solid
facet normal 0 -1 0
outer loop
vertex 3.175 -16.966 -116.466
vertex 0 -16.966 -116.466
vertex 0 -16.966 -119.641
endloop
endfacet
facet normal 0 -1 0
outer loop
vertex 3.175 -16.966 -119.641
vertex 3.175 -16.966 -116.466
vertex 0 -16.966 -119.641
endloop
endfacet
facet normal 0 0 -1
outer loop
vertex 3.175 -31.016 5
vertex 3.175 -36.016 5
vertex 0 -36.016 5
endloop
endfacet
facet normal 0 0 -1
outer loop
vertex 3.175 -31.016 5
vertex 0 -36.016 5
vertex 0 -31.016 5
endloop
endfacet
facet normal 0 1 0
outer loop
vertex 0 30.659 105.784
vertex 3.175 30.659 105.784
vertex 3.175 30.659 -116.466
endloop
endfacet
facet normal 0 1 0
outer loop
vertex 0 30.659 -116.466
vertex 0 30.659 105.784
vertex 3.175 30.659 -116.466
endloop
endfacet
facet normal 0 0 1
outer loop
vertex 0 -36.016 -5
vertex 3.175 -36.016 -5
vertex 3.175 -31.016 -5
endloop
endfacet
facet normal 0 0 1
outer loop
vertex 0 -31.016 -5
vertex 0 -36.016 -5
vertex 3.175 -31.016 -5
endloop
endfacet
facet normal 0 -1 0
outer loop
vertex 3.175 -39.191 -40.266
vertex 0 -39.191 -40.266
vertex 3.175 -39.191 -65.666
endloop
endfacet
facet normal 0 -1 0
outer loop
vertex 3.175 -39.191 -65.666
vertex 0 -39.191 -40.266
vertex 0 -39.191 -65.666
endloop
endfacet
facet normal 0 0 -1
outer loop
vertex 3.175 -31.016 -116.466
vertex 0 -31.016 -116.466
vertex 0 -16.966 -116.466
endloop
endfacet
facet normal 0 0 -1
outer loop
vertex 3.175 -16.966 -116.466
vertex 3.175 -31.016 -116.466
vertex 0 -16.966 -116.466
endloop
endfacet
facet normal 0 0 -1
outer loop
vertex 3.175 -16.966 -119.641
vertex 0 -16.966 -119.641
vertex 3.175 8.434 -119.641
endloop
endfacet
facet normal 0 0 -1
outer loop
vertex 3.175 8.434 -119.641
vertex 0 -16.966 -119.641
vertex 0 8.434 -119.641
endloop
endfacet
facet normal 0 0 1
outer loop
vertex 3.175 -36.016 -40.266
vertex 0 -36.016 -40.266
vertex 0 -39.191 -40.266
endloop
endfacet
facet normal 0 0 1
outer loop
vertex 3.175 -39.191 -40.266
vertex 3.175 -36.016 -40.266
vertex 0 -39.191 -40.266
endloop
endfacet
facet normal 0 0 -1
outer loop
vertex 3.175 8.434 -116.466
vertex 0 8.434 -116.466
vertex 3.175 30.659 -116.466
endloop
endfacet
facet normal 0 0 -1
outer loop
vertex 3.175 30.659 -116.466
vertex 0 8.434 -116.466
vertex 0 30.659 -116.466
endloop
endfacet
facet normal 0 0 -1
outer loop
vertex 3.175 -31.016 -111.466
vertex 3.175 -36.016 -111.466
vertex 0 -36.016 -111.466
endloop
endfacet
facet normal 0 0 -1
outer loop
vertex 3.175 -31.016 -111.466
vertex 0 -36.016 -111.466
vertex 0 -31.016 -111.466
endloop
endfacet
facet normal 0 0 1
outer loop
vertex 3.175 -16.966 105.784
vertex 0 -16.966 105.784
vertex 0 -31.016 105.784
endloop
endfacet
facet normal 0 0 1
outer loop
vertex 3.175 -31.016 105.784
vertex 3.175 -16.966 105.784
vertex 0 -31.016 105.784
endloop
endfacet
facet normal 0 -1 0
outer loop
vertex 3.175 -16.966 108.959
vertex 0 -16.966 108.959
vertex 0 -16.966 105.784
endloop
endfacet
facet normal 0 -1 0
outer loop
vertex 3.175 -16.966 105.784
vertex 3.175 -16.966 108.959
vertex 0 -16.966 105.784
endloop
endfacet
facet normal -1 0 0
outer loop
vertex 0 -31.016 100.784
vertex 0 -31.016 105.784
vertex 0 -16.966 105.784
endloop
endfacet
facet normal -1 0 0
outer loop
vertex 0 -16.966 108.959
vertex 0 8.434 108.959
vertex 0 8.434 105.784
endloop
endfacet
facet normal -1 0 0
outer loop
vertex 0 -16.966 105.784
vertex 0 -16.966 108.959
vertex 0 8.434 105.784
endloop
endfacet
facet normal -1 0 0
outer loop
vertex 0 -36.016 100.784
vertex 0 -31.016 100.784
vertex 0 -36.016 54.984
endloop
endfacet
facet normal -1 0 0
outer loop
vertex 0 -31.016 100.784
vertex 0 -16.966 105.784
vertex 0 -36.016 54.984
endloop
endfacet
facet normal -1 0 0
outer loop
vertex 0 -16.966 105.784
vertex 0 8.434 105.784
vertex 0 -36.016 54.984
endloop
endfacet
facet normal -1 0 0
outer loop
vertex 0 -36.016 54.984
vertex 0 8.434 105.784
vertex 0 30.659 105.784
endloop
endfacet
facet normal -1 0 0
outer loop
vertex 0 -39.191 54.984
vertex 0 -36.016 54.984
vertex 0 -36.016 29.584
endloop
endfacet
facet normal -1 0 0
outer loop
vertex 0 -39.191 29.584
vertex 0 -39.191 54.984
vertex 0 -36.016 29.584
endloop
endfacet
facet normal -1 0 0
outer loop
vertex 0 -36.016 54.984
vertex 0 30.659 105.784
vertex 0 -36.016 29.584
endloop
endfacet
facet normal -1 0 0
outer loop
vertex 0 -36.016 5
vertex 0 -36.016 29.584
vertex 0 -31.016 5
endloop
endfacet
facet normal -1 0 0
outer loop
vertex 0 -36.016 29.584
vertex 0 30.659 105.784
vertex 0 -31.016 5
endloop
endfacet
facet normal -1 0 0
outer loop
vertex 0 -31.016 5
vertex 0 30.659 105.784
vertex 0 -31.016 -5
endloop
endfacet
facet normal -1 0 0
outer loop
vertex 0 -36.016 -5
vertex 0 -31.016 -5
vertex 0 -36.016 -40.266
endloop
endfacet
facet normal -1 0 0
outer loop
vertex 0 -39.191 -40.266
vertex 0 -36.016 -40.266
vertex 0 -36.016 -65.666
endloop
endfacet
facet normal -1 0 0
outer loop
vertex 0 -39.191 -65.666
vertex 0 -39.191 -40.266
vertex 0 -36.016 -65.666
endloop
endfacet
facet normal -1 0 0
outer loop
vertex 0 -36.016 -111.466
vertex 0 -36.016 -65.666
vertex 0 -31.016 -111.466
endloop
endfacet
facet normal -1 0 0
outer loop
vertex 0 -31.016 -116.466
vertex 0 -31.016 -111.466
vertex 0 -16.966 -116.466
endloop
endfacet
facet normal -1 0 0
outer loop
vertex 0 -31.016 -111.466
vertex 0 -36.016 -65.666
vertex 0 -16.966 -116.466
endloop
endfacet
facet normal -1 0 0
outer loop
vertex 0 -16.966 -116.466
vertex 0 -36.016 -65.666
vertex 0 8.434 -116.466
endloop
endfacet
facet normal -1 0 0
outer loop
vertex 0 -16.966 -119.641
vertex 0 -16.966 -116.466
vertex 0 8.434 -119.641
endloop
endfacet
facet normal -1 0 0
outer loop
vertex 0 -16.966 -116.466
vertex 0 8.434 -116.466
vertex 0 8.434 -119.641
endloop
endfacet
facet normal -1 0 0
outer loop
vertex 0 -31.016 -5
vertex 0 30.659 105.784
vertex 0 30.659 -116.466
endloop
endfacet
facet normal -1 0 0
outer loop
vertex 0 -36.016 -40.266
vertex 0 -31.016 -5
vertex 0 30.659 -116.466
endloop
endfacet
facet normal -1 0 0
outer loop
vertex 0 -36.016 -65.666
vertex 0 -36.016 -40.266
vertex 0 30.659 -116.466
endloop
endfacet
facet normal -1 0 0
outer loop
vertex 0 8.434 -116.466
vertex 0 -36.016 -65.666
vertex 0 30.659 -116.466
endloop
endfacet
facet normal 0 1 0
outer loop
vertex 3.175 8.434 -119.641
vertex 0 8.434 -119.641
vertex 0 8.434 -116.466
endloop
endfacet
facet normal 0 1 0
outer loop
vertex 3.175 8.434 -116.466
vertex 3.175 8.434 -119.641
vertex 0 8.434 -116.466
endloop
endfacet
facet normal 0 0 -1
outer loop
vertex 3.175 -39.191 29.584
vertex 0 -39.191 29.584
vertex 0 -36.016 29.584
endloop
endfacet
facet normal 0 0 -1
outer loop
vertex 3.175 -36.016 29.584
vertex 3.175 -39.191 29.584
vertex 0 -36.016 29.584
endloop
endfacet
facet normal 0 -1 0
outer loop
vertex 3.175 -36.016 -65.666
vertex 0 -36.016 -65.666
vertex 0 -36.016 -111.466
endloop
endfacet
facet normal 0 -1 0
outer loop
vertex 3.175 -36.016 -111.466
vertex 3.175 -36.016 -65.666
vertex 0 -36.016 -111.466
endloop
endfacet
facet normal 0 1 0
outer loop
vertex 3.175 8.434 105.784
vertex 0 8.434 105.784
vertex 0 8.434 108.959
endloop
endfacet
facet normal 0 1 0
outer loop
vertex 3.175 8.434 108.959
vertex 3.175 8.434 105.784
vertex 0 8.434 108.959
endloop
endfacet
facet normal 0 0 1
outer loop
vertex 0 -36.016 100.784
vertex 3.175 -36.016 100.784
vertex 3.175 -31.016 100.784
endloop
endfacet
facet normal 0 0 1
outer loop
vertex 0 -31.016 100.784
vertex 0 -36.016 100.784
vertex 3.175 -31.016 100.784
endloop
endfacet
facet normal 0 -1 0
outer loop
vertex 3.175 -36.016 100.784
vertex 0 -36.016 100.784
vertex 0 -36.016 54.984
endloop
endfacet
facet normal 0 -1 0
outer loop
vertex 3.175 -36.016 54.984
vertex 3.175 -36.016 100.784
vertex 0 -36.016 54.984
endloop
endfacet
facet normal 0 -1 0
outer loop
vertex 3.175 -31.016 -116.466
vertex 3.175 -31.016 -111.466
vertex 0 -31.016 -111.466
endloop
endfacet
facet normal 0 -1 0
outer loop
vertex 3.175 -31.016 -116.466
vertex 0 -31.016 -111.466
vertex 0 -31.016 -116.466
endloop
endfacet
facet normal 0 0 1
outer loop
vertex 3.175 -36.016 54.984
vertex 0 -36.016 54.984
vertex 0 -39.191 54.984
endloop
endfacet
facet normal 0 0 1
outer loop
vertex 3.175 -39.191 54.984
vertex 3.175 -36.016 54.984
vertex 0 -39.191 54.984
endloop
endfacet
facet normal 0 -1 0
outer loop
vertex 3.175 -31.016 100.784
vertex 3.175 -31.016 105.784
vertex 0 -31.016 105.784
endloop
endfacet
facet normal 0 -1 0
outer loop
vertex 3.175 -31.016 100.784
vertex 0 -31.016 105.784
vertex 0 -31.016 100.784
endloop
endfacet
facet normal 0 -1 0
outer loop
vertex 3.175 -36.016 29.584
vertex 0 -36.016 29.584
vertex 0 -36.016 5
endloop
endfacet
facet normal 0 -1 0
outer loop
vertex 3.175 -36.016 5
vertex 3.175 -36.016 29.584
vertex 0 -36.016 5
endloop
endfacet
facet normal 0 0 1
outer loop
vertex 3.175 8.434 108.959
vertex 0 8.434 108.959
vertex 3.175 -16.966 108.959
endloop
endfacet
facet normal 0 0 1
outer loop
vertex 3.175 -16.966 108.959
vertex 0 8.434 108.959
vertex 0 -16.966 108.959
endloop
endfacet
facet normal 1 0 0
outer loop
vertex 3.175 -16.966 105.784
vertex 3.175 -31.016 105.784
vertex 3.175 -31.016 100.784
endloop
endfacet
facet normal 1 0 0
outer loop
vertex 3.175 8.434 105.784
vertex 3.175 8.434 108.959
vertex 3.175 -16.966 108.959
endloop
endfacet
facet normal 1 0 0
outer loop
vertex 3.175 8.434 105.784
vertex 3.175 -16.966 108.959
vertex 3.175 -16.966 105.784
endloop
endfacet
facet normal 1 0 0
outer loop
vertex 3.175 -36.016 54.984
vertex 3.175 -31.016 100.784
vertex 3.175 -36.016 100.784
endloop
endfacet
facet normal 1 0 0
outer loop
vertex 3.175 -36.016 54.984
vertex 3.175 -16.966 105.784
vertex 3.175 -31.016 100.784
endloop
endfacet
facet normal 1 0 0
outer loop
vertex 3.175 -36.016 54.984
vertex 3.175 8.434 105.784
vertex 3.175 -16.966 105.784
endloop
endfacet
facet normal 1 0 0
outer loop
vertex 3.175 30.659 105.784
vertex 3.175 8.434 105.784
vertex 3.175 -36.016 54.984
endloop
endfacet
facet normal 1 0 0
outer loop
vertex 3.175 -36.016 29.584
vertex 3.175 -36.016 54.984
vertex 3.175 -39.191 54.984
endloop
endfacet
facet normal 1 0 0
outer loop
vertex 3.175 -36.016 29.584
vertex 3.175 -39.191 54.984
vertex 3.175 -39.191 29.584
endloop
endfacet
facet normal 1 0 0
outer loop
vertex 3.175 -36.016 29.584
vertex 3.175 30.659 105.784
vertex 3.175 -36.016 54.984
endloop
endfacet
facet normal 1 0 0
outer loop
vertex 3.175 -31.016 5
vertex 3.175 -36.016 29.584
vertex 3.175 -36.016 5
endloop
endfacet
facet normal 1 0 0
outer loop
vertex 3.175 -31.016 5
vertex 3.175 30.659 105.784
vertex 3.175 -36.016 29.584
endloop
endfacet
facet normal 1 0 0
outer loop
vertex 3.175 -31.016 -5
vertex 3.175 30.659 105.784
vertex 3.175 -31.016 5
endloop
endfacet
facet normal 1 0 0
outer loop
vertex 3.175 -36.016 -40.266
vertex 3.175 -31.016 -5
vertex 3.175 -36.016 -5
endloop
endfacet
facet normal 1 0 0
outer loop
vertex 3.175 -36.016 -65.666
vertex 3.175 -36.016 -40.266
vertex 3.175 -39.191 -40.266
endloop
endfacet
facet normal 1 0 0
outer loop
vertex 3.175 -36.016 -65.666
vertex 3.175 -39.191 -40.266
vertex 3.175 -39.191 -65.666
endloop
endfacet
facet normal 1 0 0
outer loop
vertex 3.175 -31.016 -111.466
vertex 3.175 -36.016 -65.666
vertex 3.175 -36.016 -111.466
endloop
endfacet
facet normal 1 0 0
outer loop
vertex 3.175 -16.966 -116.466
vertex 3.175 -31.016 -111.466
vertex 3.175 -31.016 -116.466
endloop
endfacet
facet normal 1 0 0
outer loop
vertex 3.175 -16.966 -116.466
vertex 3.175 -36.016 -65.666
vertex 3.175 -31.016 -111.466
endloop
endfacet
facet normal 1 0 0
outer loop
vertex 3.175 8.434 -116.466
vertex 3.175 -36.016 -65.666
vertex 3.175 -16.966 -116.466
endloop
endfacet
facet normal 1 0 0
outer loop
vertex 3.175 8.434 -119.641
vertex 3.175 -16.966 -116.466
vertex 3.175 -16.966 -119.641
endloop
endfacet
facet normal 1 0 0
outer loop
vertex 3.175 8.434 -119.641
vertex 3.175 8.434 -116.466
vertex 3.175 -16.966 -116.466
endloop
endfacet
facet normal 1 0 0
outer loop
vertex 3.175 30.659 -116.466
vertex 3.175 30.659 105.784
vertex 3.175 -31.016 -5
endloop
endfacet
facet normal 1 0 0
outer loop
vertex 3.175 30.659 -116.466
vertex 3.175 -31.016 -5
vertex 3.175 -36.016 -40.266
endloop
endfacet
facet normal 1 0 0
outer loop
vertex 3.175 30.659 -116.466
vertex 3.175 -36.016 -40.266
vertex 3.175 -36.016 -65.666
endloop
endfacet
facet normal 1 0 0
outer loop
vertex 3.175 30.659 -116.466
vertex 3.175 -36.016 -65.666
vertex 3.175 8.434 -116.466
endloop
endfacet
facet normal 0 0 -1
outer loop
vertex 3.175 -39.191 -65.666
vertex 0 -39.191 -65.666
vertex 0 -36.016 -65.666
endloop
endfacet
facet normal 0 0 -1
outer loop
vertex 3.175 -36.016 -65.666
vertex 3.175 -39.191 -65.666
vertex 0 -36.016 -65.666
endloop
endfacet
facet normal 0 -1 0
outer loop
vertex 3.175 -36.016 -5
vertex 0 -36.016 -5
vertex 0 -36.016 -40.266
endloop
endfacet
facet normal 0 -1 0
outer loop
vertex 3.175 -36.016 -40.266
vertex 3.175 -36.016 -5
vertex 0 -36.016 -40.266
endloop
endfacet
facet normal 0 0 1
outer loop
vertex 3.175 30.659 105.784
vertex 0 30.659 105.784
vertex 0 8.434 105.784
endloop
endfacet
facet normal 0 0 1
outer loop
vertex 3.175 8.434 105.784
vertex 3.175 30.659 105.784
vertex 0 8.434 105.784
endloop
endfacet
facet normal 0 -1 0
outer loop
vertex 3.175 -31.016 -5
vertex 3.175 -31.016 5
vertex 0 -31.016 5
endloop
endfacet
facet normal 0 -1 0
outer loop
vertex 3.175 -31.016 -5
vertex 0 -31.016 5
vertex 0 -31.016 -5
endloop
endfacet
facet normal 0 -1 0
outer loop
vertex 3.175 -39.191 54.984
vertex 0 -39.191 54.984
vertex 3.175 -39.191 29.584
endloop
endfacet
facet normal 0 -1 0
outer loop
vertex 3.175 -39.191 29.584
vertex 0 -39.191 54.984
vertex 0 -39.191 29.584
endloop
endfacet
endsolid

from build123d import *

# Parameters (mm, degrees)
BOSS_EXTRUDE1_DEPTH = 3.175
SKETCH2_W           = 222.25
SKETCH2_H           = 3.175
CUT_EXTRUDE1_DEPTH  = 4.175
SKETCH3_W           = 5
SKETCH3_H           = 5
SKETCH3_W_2         = 10
CUT_EXTRUDE2_DEPTH  = 10


with BuildPart() as part:
    # Sketch1 → Boss-Extrude1 (new body)
    with BuildSketch(Plane(origin=(0, 0, 0), x_dir=(0, 0, -1), z_dir=(1, 0, 0))):
        Polygon((-105.784096482, 33.834012461), (-105.784096482, 8.434012461), (-108.959096482, 8.434012461), (-108.959096482, -16.965987539), (-105.784096482, -16.965987539), (-105.784096482, -36.015987539), (-54.984096482, -36.015987539), (-54.984096482, -39.190987539), (-29.584096482, -39.190987539), (-29.584096482, -36.015987539), (40.265903518, -36.015987539), (40.265903518, -39.190987539), (65.665903518, -39.190987539), (65.665903518, -36.015987539), (116.465903518, -36.015987539), (116.465903518, -16.965987539), (119.640903518, -16.965987539), (119.640903518, 8.434012461), (116.465903518, 8.434012461), (116.465903518, 33.834012461), align=None)
    extrude(amount=BOSS_EXTRUDE1_DEPTH)

    # Sketch2 → Cut-Extrude1 (cut, through all)
    with BuildSketch(Plane(origin=(3.175, 0, 0), x_dir=(0, 0, -1), z_dir=(1, 0, 0))):
        with Locations((5.340903518, 32.246512461)):
            Rectangle(SKETCH2_W, SKETCH2_H)
    extrude(amount=-CUT_EXTRUDE1_DEPTH, mode=Mode.SUBTRACT)

    # Sketch3 → Cut-Extrude2 (cut)
    with BuildSketch(Plane(origin=(3.175, 0, 0), x_dir=(0, 0, -1), z_dir=(1, 0, 0))):
        with Locations((-103.284096482, -33.515987539)):
            Rectangle(SKETCH3_W, SKETCH3_H)
        with Locations((113.965903518, -33.515987539)):
            Rectangle(SKETCH3_W, SKETCH3_H)
        with Locations((0, -33.515987539)):
            Rectangle(SKETCH3_W_2, SKETCH3_H)
    extrude(amount=-CUT_EXTRUDE2_DEPTH, mode=Mode.SUBTRACT)


solid = part.part
